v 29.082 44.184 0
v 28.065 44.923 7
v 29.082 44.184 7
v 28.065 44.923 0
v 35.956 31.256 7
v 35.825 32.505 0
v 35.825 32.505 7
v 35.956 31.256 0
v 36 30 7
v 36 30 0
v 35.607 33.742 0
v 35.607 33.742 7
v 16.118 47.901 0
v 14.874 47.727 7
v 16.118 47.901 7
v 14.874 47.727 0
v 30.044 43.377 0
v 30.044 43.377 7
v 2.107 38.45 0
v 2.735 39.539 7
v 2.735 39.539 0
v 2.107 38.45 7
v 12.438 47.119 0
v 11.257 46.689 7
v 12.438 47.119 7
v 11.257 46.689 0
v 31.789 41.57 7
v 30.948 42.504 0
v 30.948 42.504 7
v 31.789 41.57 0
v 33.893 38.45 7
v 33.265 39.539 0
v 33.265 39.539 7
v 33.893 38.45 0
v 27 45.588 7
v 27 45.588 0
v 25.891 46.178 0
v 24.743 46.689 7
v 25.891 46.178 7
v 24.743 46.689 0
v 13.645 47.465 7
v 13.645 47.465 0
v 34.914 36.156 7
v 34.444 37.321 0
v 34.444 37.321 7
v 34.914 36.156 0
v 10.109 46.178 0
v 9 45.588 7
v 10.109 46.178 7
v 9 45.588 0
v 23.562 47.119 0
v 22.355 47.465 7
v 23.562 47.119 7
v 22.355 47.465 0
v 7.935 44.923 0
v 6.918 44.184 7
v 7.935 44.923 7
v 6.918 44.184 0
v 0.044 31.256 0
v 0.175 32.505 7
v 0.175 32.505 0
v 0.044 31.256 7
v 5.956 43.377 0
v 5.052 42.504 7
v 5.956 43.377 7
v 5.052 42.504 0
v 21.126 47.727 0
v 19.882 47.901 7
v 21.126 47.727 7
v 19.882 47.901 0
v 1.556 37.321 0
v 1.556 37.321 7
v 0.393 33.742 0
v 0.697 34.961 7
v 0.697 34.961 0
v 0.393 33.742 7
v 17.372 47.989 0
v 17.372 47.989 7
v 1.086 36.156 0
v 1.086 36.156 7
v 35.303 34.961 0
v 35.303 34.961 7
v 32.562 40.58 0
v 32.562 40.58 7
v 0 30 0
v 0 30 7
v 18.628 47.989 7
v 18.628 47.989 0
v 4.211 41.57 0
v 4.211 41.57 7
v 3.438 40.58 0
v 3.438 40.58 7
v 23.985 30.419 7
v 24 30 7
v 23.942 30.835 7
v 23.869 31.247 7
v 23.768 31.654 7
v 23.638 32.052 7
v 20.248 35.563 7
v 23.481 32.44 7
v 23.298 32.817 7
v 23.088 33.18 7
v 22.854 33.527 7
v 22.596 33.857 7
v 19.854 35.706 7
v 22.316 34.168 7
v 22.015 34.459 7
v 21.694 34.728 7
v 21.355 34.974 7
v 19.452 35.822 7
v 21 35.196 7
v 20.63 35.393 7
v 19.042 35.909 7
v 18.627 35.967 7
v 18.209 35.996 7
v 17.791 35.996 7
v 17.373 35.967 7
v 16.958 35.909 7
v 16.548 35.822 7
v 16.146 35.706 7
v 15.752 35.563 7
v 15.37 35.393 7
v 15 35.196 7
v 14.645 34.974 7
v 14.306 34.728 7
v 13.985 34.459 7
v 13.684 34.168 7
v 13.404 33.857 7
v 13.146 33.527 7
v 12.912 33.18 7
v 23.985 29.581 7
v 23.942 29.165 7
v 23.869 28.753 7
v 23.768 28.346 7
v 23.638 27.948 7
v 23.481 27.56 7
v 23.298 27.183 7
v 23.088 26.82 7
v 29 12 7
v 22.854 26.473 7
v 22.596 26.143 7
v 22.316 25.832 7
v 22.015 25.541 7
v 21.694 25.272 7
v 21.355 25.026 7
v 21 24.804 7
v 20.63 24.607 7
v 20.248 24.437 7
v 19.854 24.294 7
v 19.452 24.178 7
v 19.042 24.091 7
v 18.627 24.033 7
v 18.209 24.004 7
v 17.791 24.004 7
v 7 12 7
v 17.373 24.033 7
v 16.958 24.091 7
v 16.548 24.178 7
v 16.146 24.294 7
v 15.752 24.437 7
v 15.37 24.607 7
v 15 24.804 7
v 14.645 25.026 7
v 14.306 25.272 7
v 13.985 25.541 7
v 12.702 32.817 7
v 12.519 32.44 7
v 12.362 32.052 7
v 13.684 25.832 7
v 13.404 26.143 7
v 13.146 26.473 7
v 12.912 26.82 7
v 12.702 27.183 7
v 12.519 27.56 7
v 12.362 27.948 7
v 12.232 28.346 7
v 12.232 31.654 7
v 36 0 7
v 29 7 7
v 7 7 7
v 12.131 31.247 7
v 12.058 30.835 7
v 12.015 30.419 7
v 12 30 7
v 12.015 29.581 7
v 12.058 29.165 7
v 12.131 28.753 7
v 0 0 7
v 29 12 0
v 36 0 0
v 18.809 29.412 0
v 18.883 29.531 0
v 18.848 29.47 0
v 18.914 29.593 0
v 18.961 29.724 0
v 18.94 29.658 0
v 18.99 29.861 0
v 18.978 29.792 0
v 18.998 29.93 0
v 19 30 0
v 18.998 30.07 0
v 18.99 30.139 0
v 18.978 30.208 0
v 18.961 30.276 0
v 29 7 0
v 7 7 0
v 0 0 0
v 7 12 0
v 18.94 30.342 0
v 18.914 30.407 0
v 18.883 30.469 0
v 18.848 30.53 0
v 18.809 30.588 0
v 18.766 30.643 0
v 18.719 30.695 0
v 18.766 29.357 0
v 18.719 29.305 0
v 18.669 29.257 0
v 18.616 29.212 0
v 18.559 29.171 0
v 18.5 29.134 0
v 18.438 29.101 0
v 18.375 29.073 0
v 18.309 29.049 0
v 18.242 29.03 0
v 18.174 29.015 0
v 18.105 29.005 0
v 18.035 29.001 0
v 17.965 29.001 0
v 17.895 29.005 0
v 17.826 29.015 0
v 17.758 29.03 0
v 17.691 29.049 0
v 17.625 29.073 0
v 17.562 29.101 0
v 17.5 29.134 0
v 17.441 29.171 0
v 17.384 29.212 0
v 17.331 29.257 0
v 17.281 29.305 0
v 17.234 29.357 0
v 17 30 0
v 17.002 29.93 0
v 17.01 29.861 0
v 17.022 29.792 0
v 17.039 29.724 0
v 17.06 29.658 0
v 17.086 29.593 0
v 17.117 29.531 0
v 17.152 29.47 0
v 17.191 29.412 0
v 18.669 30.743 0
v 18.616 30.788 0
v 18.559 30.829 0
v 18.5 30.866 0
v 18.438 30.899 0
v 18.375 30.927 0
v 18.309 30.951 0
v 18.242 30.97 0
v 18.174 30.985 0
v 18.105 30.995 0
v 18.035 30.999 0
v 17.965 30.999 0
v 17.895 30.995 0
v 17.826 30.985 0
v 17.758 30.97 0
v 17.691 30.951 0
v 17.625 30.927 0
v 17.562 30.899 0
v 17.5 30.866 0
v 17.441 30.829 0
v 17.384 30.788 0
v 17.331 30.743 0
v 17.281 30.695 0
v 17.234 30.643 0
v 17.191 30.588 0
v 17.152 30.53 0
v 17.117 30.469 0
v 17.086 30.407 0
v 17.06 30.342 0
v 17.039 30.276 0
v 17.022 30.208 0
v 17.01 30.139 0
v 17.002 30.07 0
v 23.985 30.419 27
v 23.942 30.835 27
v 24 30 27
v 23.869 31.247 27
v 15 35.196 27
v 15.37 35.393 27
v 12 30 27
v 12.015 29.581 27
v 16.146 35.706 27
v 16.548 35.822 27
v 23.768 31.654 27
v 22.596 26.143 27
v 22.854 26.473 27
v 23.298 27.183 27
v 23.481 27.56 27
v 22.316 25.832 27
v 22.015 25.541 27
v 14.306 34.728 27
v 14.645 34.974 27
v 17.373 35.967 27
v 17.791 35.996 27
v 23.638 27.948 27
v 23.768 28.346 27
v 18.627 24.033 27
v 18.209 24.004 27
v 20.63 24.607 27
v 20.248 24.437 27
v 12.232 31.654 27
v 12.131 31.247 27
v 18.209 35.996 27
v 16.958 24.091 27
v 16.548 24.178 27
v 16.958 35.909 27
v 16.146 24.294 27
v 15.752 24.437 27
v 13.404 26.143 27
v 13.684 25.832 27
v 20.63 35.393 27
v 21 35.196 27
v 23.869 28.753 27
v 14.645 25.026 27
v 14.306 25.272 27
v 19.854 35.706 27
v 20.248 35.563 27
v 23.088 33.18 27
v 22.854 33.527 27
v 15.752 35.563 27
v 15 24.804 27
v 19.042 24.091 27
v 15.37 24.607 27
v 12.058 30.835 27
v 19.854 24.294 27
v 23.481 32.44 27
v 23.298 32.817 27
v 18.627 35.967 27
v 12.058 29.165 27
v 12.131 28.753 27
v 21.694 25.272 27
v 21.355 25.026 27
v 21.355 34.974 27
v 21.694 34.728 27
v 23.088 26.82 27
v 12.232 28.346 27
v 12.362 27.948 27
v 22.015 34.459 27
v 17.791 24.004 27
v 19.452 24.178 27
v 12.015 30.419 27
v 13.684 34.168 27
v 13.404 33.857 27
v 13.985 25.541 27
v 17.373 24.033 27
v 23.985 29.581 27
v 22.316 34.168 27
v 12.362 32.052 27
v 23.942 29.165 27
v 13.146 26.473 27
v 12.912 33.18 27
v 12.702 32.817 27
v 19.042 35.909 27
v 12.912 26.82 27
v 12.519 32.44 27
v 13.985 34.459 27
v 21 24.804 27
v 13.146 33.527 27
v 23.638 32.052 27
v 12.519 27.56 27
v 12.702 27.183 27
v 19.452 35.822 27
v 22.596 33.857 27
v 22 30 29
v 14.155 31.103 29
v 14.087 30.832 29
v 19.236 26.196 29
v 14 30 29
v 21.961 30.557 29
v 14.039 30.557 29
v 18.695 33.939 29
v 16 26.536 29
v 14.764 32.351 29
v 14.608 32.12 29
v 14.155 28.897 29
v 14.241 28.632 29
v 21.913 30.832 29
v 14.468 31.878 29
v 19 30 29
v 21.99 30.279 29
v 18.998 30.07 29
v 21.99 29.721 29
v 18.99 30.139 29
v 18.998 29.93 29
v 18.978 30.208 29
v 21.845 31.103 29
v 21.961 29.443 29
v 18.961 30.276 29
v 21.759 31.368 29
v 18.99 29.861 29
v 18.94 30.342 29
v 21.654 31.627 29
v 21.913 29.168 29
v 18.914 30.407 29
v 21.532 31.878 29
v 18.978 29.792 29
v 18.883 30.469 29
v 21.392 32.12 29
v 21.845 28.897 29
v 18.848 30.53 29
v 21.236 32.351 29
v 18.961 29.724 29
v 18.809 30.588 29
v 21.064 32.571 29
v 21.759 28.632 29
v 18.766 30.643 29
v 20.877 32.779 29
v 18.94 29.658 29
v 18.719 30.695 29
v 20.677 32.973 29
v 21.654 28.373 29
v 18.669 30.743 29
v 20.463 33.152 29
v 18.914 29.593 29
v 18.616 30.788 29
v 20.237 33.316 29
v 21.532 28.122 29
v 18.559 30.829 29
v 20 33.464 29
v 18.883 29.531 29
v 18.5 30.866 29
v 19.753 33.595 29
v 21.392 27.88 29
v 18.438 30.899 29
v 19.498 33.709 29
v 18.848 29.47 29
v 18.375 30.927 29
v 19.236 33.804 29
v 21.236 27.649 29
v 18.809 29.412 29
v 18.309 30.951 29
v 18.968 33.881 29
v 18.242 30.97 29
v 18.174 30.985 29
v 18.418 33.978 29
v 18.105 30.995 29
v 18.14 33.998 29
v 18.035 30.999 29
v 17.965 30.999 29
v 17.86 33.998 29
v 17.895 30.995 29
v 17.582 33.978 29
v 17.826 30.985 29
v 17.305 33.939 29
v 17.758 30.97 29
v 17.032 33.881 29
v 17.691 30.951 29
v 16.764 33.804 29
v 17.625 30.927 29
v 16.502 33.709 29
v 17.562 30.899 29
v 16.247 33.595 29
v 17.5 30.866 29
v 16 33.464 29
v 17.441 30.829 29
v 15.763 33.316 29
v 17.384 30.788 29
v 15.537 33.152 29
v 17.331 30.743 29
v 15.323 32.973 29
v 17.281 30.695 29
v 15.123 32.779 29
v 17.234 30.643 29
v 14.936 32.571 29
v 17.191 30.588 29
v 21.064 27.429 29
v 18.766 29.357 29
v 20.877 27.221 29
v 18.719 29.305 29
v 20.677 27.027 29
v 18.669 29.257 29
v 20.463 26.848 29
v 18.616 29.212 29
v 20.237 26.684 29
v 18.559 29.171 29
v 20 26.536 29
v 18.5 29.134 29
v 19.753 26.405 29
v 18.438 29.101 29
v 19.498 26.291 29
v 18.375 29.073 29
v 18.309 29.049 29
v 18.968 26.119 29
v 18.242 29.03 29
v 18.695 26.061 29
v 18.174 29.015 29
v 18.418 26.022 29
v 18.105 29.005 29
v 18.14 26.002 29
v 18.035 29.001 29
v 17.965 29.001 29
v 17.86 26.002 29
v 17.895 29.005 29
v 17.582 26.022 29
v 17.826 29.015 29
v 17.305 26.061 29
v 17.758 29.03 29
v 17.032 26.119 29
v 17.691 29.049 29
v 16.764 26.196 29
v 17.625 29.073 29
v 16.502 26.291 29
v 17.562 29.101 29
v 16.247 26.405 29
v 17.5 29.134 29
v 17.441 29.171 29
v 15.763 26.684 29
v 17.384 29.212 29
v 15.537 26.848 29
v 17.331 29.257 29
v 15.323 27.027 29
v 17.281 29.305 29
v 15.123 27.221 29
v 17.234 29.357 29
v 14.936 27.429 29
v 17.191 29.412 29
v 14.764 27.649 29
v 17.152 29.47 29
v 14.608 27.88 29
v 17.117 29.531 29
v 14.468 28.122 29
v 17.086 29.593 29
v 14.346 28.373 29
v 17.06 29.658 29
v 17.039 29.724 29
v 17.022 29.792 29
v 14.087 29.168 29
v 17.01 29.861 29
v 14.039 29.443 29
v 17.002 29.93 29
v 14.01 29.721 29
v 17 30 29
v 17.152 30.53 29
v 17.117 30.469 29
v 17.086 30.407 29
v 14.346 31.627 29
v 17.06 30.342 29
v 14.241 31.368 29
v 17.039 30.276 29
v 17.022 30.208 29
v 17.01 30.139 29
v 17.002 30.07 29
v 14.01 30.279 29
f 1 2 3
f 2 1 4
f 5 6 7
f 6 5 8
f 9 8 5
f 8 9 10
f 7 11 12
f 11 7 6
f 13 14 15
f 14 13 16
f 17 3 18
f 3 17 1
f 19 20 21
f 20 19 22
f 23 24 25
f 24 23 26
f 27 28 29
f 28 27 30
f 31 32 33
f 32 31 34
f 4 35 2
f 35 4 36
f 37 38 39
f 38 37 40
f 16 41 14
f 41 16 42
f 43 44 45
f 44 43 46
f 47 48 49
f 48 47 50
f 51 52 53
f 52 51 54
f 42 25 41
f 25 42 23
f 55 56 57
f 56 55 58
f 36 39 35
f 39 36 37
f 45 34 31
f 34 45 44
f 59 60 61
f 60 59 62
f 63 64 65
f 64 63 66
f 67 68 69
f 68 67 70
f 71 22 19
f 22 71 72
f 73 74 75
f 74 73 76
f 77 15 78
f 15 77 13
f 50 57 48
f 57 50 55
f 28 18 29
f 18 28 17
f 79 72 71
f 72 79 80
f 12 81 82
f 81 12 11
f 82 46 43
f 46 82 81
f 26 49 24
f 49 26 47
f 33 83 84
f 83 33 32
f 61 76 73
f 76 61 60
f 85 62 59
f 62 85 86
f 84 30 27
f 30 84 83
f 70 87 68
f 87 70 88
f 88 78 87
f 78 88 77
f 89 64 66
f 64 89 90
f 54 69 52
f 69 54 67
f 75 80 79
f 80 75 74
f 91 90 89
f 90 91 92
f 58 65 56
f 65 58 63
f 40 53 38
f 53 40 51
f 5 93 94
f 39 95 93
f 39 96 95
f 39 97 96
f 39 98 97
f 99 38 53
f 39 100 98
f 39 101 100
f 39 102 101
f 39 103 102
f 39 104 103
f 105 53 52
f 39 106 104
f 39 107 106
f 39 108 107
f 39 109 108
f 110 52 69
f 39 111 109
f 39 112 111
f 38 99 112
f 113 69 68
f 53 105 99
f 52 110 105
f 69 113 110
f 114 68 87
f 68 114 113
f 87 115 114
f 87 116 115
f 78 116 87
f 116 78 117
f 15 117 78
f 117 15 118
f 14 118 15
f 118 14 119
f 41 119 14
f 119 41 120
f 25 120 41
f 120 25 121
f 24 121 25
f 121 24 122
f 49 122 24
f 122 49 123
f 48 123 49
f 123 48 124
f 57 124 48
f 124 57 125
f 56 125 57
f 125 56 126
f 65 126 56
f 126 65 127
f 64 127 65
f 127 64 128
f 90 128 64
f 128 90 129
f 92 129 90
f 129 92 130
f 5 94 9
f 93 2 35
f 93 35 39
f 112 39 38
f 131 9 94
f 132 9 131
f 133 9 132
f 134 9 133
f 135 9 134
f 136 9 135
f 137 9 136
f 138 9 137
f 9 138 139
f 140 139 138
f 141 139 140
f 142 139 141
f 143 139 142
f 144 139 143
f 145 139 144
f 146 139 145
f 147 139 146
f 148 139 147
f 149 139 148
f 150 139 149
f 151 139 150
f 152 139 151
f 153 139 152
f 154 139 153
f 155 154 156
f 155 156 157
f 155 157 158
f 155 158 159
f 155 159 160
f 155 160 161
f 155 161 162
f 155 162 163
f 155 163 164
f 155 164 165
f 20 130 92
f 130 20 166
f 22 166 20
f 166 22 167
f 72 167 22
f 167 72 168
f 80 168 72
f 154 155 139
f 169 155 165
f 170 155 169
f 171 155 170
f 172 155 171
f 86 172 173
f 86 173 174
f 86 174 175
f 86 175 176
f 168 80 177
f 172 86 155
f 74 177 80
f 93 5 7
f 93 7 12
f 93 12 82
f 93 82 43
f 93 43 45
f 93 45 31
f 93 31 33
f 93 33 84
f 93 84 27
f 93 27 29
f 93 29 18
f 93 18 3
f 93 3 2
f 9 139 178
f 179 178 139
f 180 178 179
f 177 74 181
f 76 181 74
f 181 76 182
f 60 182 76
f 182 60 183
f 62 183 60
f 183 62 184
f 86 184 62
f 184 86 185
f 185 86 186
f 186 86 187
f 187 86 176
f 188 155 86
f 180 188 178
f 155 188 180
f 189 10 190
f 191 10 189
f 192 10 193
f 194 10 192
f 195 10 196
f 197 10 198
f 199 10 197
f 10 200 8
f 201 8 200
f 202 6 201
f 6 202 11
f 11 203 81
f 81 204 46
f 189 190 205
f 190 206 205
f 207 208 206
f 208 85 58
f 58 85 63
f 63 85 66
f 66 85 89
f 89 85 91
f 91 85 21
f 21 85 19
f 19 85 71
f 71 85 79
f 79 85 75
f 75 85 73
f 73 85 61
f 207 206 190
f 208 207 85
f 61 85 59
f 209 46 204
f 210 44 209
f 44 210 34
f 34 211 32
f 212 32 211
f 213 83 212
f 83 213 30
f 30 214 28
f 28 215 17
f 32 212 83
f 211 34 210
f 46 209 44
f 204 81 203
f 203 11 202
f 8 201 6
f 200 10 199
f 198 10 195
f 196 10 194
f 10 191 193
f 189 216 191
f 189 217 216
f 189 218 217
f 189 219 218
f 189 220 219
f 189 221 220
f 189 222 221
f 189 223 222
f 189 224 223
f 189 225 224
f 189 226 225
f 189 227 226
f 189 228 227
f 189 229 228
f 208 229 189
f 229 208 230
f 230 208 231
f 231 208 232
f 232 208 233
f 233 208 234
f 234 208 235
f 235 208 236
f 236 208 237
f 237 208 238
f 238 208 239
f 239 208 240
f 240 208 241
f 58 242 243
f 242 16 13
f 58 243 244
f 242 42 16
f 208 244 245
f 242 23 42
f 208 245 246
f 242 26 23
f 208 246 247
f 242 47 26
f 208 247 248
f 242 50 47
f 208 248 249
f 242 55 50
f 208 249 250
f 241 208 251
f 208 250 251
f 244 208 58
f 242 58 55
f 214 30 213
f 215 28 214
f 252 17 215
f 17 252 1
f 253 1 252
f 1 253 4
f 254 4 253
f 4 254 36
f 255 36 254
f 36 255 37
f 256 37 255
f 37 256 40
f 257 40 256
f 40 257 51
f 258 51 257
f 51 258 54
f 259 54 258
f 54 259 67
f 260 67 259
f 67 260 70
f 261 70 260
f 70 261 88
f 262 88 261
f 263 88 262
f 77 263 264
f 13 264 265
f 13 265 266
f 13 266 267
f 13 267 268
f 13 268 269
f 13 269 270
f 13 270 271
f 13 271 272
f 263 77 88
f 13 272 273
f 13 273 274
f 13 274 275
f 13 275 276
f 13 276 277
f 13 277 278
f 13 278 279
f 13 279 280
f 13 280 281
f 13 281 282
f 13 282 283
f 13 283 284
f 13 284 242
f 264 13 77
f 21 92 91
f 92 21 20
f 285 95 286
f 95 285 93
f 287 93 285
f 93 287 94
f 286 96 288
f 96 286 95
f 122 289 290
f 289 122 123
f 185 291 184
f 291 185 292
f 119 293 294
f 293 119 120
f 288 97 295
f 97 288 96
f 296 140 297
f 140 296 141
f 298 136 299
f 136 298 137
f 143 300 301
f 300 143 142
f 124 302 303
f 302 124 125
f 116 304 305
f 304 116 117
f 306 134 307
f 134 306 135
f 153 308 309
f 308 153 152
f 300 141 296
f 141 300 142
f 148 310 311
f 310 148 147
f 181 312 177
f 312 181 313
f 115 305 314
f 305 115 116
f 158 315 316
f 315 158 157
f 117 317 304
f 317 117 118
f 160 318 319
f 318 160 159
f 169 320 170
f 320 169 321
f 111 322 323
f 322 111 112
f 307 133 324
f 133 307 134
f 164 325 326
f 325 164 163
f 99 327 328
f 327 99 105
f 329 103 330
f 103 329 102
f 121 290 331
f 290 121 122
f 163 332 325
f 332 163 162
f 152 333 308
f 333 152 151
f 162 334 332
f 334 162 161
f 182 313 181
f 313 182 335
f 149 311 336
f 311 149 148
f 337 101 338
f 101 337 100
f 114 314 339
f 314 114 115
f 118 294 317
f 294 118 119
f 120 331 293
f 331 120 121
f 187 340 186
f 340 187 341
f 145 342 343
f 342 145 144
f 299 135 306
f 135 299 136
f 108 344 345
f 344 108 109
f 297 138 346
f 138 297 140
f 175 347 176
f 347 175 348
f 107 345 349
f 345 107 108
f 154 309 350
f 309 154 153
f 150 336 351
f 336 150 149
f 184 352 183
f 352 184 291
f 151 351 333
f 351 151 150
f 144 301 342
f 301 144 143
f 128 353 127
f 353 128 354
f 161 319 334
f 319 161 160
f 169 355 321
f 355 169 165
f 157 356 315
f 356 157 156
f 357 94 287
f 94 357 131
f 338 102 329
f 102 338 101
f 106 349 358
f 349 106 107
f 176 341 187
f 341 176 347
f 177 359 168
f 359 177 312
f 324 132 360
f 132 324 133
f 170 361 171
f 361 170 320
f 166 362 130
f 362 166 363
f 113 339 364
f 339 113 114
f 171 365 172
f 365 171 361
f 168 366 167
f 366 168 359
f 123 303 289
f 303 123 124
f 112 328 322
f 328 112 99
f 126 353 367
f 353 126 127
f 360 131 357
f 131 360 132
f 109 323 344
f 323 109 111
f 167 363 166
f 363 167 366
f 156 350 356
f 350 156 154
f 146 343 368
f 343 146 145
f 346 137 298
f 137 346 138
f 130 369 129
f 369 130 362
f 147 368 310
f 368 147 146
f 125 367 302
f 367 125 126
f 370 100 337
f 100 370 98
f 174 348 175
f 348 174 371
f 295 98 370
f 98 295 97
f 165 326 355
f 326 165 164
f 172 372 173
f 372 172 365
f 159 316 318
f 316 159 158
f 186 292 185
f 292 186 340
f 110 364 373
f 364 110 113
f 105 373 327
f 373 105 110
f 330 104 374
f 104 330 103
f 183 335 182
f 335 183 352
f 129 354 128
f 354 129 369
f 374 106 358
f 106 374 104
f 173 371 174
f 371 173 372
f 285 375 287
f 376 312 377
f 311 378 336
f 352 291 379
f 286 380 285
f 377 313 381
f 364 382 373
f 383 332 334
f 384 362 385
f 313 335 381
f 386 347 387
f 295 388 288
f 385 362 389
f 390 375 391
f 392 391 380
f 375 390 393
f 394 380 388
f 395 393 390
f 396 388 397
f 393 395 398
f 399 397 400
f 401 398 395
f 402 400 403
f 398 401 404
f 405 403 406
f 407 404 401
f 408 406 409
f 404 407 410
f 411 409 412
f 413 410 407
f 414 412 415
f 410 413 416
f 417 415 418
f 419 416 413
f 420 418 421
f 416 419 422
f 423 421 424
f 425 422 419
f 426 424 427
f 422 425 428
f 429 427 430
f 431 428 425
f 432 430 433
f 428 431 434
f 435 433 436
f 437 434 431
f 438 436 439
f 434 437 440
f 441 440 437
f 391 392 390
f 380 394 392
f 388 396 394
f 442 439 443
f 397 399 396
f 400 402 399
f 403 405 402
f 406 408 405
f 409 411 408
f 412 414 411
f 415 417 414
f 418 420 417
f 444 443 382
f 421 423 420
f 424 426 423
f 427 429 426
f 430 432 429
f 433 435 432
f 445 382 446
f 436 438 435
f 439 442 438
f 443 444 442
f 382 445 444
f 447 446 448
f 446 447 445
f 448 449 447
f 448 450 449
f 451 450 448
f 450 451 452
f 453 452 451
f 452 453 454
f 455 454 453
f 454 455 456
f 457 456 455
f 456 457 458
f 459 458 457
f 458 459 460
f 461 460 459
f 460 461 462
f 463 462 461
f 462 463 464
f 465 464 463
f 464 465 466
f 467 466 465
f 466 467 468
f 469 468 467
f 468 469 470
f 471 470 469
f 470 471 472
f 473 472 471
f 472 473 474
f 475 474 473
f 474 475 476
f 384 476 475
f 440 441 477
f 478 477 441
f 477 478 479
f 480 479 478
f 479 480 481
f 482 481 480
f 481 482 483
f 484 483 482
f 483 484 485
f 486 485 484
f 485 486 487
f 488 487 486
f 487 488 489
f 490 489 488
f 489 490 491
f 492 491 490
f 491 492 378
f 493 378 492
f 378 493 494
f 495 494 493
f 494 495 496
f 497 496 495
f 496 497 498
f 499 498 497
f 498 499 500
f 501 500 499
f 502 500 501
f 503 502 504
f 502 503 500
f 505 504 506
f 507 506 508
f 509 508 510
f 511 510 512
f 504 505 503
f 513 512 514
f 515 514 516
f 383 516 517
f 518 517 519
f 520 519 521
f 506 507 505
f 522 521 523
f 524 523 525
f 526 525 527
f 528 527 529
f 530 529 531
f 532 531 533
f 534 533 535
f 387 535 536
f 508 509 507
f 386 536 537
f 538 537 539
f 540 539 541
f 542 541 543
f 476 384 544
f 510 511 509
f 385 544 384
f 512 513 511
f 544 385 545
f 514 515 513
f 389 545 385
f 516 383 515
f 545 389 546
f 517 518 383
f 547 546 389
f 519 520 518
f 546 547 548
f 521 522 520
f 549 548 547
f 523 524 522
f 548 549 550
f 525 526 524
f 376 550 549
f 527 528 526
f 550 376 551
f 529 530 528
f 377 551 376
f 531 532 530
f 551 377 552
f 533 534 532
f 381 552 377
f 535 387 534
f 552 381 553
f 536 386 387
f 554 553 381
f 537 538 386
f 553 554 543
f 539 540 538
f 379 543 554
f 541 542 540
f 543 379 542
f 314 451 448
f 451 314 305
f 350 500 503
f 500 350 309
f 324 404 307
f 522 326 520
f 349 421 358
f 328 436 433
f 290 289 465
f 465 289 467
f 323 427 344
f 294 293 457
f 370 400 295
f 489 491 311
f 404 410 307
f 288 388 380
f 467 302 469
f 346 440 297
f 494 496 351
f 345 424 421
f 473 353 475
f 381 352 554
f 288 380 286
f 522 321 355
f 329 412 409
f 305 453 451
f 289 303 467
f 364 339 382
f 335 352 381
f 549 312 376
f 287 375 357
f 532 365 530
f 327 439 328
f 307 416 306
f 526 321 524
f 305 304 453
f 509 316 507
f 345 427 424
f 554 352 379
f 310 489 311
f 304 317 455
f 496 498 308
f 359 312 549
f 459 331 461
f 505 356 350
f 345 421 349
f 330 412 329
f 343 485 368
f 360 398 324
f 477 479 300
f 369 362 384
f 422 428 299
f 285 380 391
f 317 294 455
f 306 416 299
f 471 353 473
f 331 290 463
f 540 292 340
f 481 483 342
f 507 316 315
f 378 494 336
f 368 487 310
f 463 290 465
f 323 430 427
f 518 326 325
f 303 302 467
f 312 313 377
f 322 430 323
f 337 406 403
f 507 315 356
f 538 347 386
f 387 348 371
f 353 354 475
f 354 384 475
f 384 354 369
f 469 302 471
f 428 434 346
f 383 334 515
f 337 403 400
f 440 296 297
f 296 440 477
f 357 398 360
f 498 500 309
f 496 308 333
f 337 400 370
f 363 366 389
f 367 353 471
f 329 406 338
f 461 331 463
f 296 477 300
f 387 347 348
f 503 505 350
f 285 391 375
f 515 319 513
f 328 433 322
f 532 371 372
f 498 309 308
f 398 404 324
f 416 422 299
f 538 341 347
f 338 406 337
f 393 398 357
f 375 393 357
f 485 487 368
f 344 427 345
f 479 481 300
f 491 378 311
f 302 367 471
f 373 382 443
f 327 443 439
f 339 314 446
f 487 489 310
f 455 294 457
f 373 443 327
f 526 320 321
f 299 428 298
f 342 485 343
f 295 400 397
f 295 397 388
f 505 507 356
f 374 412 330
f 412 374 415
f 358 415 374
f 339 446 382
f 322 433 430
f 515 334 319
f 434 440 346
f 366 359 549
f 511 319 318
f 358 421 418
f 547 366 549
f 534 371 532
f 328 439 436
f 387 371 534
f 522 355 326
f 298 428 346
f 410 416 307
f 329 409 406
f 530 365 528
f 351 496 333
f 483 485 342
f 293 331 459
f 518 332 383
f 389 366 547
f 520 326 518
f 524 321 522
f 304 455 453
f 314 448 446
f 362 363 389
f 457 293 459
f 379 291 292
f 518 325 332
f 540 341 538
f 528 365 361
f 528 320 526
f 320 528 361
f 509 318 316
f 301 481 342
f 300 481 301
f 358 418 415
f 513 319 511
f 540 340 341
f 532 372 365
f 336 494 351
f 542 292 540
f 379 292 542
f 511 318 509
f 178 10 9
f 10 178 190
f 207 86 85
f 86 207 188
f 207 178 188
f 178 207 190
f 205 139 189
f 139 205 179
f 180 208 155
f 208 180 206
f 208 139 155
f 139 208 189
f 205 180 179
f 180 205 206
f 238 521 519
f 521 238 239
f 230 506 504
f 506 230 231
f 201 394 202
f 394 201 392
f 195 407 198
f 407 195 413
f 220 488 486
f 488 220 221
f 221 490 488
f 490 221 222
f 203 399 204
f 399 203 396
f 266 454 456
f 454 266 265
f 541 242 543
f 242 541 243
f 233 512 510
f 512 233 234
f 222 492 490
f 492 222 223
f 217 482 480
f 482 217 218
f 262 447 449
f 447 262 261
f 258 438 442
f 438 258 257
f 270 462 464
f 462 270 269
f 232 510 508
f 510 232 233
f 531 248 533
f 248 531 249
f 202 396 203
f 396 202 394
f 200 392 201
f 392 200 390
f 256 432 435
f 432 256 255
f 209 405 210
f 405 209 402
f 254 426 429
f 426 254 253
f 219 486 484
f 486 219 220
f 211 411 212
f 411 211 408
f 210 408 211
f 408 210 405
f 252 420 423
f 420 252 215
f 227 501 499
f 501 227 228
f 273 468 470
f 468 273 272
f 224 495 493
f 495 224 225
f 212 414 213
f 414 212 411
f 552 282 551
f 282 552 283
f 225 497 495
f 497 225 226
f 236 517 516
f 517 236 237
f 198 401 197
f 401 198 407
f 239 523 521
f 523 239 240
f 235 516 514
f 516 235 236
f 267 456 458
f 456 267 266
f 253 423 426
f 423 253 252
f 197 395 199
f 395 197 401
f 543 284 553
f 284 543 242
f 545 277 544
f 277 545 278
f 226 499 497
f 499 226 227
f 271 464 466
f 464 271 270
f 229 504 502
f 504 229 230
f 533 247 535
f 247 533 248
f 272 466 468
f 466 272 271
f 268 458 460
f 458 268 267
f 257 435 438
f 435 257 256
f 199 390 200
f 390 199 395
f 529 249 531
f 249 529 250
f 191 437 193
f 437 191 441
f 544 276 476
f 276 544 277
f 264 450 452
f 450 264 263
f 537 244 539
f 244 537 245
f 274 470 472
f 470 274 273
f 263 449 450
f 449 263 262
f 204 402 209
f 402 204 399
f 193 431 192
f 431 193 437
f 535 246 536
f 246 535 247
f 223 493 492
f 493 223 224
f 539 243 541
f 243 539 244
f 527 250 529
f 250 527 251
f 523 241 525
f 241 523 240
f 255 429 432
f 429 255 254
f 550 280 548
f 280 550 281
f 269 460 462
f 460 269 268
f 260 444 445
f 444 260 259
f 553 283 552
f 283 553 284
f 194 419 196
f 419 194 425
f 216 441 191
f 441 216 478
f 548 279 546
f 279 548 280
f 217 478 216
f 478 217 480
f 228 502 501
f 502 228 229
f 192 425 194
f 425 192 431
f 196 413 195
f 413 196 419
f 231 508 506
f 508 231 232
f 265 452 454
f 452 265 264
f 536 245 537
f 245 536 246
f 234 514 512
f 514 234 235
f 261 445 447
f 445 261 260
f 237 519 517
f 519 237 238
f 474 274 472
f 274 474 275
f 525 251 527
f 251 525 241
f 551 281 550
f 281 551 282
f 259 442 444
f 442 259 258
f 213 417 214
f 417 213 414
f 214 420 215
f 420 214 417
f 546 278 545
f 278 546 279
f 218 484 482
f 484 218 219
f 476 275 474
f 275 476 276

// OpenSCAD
$fn=90;
pole=12;
pole_h=20;
pole_taper=2;

strap_w=22;
strap_h=5;

base_h=7;
strap_wall=base_h;

pad=0.1;
padd=pad*2;

pin=2;

difference() {
    union() {
        cube([strap_w+strap_wall*2,strap_w/2+strap_wall+strap_h+strap_wall,base_h]);
        translate([strap_w/2+strap_wall,strap_w/2+strap_wall+strap_h+strap_wall,0]) {
            cylinder(d=strap_w+strap_wall*2,h=base_h);
            cylinder(d=pole,h=base_h+pole_h);
            translate([0,0,pole_h+base_h])
            cylinder(d1=pole,d2=pole-pole_taper*2,h=pole_taper);
        }
    }
    translate([strap_wall,strap_wall,-pad])
    cube([strap_w,strap_h,base_h+padd]);
    translate([strap_w/2+strap_wall,strap_w/2+strap_wall+strap_h+strap_wall,-pad])
    cylinder(d=pin,h=pole_h*2);
}
